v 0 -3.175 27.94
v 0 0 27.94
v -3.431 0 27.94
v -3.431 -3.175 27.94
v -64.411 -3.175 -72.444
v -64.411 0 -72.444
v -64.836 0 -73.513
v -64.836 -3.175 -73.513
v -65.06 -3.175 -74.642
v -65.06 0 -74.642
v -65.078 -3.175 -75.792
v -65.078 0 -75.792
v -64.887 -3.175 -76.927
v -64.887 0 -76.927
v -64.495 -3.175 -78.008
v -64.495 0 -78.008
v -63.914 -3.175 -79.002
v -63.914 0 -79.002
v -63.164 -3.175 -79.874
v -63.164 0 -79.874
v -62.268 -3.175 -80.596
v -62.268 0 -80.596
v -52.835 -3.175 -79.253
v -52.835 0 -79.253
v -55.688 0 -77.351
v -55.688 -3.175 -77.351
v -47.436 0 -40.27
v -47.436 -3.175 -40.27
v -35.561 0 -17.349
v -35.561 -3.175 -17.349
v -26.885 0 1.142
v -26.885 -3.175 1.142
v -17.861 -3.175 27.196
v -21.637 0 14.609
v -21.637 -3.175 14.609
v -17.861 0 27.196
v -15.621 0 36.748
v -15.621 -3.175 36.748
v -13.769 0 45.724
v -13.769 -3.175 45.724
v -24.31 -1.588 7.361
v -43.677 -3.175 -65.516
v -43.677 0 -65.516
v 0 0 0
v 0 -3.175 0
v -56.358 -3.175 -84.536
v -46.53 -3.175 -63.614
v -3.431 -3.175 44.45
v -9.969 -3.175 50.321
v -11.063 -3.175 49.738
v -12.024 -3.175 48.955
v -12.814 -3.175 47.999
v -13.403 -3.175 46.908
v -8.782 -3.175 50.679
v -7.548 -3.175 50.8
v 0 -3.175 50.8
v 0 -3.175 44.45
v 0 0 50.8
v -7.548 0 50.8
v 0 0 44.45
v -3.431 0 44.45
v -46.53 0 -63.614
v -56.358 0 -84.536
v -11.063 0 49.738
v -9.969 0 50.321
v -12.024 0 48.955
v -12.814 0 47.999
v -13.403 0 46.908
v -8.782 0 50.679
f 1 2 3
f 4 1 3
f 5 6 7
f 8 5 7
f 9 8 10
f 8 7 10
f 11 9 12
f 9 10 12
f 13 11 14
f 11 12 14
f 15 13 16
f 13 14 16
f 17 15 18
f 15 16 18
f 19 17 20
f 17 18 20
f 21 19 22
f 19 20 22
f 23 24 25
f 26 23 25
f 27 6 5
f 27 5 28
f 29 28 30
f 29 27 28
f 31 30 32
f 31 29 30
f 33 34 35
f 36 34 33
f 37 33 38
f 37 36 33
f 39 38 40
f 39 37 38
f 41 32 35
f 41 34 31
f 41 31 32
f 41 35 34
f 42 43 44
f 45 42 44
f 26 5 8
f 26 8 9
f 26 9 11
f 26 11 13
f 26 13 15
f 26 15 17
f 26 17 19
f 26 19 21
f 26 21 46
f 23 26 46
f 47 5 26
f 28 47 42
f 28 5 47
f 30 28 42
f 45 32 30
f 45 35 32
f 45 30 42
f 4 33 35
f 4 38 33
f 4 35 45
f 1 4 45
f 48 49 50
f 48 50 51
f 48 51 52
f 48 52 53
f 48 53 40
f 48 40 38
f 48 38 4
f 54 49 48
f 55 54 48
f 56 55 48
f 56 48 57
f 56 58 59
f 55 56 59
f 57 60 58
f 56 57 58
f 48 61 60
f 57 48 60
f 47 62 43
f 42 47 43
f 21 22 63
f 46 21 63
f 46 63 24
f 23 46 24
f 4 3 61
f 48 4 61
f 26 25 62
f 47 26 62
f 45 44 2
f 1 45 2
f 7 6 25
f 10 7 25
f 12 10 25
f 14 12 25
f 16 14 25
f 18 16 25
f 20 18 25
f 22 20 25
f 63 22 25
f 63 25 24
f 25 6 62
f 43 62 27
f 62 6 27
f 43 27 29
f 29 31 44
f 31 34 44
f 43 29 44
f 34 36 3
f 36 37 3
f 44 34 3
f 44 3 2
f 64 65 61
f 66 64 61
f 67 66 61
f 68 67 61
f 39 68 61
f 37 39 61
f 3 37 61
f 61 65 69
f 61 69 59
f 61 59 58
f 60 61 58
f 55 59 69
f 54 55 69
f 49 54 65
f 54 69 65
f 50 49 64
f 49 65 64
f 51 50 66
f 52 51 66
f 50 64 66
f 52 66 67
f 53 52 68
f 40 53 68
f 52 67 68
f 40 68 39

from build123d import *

# Parameters (mm, degrees)
F1_DEPTH = 3.175


with BuildPart() as f1:
    # F0 (on Front) → F1 (new body)
    with BuildSketch(Plane.XZ):
        with BuildLine():
            Line((0, 44.45), (0, 50.8))
            Line((0, 50.8), (-7.5480276247, 50.8))
            ThreePointArc((-7.5480276247, 50.8), (-11.562630681, 49.3699047044), (-13.7689613138, 45.7237676536))
            add(Edge.make_bspline(
                [(-64.410986219, -72.4440826605), (-52.5487020452, -49.0149730571), (-21.6871593471, 4.2499979949), (-16.0587888167, 34.5405153431), (-13.7689613138, 45.7237676536)],
                knots=[0.0408273323, 0.0408273323, 0.0408273323, 0.0408273323, 0.5923666484, 0.9461049167, 0.9461049167, 0.9461049167, 0.9461049167], degree=3))
            ThreePointArc((-64.410986219, -72.4440826605), (-64.8870877436, -76.926826479), (-62.2680803146, -80.5959496565))
            Line((-62.2680803146, -80.5959496565), (-56.3575398982, -84.5363099303))
            Line((-56.3575398982, -84.5363099303), (-52.8351936545, -79.2527905596))
            Line((-52.8351936545, -79.2527905596), (-55.6882941147, -77.3507235881))
            Line((-55.6882941147, -77.3507235881), (-46.5301938812, -63.6135732244))
            Line((-46.5301938812, -63.6135732244), (-43.6770934211, -65.515640196))
            Line((-43.6770934211, -65.515640196), (0, 0))
            Line((0, 0), (0, 27.94))
            Line((0, 27.94), (-3.4312817734, 27.94))
            Line((-3.4312817734, 27.94), (-3.4312817734, 44.45))
            Line((-3.4312817734, 44.45), (0, 44.45))
        make_face()
    extrude(amount=F1_DEPTH)


solid = f1.part
